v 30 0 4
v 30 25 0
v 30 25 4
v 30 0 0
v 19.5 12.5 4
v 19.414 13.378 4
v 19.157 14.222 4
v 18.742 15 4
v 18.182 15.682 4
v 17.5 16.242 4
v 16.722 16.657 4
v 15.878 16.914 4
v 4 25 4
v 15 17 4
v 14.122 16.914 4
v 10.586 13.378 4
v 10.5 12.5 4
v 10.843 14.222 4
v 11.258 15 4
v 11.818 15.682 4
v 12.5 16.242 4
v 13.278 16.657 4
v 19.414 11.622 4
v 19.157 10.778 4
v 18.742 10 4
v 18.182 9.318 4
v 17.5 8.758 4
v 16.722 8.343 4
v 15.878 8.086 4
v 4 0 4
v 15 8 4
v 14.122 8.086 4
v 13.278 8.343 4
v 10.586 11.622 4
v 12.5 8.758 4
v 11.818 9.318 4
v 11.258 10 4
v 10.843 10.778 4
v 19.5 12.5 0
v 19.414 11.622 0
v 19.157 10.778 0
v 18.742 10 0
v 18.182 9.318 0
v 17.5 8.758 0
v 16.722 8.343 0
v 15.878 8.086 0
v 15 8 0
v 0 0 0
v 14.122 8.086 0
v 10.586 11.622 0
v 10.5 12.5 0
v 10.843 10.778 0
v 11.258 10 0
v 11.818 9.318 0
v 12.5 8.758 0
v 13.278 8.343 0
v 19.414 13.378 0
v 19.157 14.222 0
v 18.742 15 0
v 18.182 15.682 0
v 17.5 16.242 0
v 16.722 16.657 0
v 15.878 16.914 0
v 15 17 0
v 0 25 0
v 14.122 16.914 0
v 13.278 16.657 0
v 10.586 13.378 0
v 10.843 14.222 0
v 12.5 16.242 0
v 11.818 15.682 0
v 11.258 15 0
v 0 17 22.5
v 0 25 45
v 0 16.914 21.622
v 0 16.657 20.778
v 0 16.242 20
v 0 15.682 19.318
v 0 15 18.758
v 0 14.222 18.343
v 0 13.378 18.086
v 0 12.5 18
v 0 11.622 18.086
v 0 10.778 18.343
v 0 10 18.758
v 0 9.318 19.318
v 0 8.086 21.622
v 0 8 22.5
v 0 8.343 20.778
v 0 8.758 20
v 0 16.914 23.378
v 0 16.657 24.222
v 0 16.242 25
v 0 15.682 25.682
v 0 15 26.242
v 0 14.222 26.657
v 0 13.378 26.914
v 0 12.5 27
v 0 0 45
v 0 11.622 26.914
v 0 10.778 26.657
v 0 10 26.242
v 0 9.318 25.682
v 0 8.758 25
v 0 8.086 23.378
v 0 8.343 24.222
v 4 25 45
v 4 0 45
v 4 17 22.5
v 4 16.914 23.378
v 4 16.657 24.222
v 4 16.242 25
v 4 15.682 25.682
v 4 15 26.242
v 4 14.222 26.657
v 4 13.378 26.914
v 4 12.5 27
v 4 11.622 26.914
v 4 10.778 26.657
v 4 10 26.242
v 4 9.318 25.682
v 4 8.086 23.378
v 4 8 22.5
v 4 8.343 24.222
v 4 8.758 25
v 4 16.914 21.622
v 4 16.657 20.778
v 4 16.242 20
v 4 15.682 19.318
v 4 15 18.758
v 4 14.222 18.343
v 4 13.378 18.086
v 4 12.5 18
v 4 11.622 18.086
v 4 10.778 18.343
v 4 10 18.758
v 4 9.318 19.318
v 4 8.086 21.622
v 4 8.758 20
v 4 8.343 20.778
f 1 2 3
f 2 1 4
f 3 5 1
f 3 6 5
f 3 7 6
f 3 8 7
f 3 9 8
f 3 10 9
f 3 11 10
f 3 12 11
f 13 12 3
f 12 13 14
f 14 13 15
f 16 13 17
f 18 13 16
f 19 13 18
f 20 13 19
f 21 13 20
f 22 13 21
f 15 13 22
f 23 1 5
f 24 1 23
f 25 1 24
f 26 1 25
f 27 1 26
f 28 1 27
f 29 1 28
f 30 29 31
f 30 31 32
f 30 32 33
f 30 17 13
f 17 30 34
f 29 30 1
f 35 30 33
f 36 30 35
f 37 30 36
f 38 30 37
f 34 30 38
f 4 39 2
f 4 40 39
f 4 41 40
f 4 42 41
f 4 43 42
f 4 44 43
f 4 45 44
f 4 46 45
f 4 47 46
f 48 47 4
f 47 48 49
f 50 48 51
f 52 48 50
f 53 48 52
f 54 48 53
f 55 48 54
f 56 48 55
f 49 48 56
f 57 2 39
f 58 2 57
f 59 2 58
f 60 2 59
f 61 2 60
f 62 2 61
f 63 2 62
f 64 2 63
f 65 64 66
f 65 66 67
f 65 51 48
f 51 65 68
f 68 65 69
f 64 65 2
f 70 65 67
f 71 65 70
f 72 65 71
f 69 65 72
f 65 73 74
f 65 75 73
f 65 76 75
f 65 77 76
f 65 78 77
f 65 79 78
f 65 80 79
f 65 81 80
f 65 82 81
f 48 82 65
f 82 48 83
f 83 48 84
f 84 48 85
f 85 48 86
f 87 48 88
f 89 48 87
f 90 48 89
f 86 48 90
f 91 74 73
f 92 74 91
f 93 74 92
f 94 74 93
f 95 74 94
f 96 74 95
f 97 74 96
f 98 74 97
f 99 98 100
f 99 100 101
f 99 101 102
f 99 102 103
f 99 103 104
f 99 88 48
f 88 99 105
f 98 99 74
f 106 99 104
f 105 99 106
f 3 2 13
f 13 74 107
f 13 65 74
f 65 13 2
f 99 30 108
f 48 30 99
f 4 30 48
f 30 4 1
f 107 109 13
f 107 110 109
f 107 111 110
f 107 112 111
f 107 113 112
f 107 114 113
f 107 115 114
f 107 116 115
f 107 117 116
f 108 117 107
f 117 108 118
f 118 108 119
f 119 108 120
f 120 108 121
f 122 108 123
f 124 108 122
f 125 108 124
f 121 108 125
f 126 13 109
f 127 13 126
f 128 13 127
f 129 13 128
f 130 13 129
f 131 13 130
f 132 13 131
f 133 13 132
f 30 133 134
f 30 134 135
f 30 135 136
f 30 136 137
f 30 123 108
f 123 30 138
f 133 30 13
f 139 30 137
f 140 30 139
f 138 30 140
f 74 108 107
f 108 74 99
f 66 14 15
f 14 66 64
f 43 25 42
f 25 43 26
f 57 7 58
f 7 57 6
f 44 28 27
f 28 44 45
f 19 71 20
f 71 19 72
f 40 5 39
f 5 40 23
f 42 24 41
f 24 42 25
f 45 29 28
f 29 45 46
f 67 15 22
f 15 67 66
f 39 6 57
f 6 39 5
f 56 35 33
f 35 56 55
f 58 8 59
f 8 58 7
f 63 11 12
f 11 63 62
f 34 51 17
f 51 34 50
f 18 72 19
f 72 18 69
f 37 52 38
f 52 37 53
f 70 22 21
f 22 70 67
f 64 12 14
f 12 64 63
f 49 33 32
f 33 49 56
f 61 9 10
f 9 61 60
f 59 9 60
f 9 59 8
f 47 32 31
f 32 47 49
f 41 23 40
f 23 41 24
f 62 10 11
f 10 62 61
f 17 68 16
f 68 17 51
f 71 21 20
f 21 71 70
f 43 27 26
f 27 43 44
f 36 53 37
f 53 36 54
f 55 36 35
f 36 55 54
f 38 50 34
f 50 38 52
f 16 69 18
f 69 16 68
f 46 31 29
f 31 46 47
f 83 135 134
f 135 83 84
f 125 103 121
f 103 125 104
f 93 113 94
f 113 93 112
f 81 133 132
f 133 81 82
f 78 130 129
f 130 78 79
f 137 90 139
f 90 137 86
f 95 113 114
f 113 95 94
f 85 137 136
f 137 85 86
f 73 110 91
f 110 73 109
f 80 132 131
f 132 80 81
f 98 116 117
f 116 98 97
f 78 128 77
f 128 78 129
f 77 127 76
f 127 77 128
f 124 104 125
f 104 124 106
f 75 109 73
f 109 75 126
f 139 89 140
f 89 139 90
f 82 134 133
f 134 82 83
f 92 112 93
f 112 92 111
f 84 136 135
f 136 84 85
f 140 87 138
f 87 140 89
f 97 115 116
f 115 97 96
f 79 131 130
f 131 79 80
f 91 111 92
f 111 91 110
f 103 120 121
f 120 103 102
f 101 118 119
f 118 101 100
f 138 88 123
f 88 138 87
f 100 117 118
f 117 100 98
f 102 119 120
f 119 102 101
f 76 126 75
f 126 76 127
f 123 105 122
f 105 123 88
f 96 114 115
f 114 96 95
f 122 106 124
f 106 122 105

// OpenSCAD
$fn = 32;

// ----------------------------------------------------------------------
// L-bracket: 30 x 25 x 45 mm
// ----------------------------------------------------------------------

// --- parameters (mm) ---
base_len = 30;            // horizontal leg, X
upright_h = 45;           // vertical leg, Z
flange_w = 25;            // bracket depth, Y
mat_t = 4;                // plate thickness
hole_d = 9;               // clearance for M8

module hole_z(px, py) {
  translate([px, py, -0.5]) cylinder(h = mat_t + 1, d = hole_d);
}
module hole_x(pz, py) {
  translate([-0.5, py, pz]) rotate([0, 90, 0]) cylinder(h = mat_t + 1, d = hole_d);
}

difference() {
  union() {
    /* horizontal leg */
    cube([base_len, flange_w, mat_t]);
    /* vertical leg, overlapping the corner block */
    cube([mat_t, flange_w, upright_h]);
  }
  hole_z(15, 12.5);
  hole_x(22.5, 12.5);
}
